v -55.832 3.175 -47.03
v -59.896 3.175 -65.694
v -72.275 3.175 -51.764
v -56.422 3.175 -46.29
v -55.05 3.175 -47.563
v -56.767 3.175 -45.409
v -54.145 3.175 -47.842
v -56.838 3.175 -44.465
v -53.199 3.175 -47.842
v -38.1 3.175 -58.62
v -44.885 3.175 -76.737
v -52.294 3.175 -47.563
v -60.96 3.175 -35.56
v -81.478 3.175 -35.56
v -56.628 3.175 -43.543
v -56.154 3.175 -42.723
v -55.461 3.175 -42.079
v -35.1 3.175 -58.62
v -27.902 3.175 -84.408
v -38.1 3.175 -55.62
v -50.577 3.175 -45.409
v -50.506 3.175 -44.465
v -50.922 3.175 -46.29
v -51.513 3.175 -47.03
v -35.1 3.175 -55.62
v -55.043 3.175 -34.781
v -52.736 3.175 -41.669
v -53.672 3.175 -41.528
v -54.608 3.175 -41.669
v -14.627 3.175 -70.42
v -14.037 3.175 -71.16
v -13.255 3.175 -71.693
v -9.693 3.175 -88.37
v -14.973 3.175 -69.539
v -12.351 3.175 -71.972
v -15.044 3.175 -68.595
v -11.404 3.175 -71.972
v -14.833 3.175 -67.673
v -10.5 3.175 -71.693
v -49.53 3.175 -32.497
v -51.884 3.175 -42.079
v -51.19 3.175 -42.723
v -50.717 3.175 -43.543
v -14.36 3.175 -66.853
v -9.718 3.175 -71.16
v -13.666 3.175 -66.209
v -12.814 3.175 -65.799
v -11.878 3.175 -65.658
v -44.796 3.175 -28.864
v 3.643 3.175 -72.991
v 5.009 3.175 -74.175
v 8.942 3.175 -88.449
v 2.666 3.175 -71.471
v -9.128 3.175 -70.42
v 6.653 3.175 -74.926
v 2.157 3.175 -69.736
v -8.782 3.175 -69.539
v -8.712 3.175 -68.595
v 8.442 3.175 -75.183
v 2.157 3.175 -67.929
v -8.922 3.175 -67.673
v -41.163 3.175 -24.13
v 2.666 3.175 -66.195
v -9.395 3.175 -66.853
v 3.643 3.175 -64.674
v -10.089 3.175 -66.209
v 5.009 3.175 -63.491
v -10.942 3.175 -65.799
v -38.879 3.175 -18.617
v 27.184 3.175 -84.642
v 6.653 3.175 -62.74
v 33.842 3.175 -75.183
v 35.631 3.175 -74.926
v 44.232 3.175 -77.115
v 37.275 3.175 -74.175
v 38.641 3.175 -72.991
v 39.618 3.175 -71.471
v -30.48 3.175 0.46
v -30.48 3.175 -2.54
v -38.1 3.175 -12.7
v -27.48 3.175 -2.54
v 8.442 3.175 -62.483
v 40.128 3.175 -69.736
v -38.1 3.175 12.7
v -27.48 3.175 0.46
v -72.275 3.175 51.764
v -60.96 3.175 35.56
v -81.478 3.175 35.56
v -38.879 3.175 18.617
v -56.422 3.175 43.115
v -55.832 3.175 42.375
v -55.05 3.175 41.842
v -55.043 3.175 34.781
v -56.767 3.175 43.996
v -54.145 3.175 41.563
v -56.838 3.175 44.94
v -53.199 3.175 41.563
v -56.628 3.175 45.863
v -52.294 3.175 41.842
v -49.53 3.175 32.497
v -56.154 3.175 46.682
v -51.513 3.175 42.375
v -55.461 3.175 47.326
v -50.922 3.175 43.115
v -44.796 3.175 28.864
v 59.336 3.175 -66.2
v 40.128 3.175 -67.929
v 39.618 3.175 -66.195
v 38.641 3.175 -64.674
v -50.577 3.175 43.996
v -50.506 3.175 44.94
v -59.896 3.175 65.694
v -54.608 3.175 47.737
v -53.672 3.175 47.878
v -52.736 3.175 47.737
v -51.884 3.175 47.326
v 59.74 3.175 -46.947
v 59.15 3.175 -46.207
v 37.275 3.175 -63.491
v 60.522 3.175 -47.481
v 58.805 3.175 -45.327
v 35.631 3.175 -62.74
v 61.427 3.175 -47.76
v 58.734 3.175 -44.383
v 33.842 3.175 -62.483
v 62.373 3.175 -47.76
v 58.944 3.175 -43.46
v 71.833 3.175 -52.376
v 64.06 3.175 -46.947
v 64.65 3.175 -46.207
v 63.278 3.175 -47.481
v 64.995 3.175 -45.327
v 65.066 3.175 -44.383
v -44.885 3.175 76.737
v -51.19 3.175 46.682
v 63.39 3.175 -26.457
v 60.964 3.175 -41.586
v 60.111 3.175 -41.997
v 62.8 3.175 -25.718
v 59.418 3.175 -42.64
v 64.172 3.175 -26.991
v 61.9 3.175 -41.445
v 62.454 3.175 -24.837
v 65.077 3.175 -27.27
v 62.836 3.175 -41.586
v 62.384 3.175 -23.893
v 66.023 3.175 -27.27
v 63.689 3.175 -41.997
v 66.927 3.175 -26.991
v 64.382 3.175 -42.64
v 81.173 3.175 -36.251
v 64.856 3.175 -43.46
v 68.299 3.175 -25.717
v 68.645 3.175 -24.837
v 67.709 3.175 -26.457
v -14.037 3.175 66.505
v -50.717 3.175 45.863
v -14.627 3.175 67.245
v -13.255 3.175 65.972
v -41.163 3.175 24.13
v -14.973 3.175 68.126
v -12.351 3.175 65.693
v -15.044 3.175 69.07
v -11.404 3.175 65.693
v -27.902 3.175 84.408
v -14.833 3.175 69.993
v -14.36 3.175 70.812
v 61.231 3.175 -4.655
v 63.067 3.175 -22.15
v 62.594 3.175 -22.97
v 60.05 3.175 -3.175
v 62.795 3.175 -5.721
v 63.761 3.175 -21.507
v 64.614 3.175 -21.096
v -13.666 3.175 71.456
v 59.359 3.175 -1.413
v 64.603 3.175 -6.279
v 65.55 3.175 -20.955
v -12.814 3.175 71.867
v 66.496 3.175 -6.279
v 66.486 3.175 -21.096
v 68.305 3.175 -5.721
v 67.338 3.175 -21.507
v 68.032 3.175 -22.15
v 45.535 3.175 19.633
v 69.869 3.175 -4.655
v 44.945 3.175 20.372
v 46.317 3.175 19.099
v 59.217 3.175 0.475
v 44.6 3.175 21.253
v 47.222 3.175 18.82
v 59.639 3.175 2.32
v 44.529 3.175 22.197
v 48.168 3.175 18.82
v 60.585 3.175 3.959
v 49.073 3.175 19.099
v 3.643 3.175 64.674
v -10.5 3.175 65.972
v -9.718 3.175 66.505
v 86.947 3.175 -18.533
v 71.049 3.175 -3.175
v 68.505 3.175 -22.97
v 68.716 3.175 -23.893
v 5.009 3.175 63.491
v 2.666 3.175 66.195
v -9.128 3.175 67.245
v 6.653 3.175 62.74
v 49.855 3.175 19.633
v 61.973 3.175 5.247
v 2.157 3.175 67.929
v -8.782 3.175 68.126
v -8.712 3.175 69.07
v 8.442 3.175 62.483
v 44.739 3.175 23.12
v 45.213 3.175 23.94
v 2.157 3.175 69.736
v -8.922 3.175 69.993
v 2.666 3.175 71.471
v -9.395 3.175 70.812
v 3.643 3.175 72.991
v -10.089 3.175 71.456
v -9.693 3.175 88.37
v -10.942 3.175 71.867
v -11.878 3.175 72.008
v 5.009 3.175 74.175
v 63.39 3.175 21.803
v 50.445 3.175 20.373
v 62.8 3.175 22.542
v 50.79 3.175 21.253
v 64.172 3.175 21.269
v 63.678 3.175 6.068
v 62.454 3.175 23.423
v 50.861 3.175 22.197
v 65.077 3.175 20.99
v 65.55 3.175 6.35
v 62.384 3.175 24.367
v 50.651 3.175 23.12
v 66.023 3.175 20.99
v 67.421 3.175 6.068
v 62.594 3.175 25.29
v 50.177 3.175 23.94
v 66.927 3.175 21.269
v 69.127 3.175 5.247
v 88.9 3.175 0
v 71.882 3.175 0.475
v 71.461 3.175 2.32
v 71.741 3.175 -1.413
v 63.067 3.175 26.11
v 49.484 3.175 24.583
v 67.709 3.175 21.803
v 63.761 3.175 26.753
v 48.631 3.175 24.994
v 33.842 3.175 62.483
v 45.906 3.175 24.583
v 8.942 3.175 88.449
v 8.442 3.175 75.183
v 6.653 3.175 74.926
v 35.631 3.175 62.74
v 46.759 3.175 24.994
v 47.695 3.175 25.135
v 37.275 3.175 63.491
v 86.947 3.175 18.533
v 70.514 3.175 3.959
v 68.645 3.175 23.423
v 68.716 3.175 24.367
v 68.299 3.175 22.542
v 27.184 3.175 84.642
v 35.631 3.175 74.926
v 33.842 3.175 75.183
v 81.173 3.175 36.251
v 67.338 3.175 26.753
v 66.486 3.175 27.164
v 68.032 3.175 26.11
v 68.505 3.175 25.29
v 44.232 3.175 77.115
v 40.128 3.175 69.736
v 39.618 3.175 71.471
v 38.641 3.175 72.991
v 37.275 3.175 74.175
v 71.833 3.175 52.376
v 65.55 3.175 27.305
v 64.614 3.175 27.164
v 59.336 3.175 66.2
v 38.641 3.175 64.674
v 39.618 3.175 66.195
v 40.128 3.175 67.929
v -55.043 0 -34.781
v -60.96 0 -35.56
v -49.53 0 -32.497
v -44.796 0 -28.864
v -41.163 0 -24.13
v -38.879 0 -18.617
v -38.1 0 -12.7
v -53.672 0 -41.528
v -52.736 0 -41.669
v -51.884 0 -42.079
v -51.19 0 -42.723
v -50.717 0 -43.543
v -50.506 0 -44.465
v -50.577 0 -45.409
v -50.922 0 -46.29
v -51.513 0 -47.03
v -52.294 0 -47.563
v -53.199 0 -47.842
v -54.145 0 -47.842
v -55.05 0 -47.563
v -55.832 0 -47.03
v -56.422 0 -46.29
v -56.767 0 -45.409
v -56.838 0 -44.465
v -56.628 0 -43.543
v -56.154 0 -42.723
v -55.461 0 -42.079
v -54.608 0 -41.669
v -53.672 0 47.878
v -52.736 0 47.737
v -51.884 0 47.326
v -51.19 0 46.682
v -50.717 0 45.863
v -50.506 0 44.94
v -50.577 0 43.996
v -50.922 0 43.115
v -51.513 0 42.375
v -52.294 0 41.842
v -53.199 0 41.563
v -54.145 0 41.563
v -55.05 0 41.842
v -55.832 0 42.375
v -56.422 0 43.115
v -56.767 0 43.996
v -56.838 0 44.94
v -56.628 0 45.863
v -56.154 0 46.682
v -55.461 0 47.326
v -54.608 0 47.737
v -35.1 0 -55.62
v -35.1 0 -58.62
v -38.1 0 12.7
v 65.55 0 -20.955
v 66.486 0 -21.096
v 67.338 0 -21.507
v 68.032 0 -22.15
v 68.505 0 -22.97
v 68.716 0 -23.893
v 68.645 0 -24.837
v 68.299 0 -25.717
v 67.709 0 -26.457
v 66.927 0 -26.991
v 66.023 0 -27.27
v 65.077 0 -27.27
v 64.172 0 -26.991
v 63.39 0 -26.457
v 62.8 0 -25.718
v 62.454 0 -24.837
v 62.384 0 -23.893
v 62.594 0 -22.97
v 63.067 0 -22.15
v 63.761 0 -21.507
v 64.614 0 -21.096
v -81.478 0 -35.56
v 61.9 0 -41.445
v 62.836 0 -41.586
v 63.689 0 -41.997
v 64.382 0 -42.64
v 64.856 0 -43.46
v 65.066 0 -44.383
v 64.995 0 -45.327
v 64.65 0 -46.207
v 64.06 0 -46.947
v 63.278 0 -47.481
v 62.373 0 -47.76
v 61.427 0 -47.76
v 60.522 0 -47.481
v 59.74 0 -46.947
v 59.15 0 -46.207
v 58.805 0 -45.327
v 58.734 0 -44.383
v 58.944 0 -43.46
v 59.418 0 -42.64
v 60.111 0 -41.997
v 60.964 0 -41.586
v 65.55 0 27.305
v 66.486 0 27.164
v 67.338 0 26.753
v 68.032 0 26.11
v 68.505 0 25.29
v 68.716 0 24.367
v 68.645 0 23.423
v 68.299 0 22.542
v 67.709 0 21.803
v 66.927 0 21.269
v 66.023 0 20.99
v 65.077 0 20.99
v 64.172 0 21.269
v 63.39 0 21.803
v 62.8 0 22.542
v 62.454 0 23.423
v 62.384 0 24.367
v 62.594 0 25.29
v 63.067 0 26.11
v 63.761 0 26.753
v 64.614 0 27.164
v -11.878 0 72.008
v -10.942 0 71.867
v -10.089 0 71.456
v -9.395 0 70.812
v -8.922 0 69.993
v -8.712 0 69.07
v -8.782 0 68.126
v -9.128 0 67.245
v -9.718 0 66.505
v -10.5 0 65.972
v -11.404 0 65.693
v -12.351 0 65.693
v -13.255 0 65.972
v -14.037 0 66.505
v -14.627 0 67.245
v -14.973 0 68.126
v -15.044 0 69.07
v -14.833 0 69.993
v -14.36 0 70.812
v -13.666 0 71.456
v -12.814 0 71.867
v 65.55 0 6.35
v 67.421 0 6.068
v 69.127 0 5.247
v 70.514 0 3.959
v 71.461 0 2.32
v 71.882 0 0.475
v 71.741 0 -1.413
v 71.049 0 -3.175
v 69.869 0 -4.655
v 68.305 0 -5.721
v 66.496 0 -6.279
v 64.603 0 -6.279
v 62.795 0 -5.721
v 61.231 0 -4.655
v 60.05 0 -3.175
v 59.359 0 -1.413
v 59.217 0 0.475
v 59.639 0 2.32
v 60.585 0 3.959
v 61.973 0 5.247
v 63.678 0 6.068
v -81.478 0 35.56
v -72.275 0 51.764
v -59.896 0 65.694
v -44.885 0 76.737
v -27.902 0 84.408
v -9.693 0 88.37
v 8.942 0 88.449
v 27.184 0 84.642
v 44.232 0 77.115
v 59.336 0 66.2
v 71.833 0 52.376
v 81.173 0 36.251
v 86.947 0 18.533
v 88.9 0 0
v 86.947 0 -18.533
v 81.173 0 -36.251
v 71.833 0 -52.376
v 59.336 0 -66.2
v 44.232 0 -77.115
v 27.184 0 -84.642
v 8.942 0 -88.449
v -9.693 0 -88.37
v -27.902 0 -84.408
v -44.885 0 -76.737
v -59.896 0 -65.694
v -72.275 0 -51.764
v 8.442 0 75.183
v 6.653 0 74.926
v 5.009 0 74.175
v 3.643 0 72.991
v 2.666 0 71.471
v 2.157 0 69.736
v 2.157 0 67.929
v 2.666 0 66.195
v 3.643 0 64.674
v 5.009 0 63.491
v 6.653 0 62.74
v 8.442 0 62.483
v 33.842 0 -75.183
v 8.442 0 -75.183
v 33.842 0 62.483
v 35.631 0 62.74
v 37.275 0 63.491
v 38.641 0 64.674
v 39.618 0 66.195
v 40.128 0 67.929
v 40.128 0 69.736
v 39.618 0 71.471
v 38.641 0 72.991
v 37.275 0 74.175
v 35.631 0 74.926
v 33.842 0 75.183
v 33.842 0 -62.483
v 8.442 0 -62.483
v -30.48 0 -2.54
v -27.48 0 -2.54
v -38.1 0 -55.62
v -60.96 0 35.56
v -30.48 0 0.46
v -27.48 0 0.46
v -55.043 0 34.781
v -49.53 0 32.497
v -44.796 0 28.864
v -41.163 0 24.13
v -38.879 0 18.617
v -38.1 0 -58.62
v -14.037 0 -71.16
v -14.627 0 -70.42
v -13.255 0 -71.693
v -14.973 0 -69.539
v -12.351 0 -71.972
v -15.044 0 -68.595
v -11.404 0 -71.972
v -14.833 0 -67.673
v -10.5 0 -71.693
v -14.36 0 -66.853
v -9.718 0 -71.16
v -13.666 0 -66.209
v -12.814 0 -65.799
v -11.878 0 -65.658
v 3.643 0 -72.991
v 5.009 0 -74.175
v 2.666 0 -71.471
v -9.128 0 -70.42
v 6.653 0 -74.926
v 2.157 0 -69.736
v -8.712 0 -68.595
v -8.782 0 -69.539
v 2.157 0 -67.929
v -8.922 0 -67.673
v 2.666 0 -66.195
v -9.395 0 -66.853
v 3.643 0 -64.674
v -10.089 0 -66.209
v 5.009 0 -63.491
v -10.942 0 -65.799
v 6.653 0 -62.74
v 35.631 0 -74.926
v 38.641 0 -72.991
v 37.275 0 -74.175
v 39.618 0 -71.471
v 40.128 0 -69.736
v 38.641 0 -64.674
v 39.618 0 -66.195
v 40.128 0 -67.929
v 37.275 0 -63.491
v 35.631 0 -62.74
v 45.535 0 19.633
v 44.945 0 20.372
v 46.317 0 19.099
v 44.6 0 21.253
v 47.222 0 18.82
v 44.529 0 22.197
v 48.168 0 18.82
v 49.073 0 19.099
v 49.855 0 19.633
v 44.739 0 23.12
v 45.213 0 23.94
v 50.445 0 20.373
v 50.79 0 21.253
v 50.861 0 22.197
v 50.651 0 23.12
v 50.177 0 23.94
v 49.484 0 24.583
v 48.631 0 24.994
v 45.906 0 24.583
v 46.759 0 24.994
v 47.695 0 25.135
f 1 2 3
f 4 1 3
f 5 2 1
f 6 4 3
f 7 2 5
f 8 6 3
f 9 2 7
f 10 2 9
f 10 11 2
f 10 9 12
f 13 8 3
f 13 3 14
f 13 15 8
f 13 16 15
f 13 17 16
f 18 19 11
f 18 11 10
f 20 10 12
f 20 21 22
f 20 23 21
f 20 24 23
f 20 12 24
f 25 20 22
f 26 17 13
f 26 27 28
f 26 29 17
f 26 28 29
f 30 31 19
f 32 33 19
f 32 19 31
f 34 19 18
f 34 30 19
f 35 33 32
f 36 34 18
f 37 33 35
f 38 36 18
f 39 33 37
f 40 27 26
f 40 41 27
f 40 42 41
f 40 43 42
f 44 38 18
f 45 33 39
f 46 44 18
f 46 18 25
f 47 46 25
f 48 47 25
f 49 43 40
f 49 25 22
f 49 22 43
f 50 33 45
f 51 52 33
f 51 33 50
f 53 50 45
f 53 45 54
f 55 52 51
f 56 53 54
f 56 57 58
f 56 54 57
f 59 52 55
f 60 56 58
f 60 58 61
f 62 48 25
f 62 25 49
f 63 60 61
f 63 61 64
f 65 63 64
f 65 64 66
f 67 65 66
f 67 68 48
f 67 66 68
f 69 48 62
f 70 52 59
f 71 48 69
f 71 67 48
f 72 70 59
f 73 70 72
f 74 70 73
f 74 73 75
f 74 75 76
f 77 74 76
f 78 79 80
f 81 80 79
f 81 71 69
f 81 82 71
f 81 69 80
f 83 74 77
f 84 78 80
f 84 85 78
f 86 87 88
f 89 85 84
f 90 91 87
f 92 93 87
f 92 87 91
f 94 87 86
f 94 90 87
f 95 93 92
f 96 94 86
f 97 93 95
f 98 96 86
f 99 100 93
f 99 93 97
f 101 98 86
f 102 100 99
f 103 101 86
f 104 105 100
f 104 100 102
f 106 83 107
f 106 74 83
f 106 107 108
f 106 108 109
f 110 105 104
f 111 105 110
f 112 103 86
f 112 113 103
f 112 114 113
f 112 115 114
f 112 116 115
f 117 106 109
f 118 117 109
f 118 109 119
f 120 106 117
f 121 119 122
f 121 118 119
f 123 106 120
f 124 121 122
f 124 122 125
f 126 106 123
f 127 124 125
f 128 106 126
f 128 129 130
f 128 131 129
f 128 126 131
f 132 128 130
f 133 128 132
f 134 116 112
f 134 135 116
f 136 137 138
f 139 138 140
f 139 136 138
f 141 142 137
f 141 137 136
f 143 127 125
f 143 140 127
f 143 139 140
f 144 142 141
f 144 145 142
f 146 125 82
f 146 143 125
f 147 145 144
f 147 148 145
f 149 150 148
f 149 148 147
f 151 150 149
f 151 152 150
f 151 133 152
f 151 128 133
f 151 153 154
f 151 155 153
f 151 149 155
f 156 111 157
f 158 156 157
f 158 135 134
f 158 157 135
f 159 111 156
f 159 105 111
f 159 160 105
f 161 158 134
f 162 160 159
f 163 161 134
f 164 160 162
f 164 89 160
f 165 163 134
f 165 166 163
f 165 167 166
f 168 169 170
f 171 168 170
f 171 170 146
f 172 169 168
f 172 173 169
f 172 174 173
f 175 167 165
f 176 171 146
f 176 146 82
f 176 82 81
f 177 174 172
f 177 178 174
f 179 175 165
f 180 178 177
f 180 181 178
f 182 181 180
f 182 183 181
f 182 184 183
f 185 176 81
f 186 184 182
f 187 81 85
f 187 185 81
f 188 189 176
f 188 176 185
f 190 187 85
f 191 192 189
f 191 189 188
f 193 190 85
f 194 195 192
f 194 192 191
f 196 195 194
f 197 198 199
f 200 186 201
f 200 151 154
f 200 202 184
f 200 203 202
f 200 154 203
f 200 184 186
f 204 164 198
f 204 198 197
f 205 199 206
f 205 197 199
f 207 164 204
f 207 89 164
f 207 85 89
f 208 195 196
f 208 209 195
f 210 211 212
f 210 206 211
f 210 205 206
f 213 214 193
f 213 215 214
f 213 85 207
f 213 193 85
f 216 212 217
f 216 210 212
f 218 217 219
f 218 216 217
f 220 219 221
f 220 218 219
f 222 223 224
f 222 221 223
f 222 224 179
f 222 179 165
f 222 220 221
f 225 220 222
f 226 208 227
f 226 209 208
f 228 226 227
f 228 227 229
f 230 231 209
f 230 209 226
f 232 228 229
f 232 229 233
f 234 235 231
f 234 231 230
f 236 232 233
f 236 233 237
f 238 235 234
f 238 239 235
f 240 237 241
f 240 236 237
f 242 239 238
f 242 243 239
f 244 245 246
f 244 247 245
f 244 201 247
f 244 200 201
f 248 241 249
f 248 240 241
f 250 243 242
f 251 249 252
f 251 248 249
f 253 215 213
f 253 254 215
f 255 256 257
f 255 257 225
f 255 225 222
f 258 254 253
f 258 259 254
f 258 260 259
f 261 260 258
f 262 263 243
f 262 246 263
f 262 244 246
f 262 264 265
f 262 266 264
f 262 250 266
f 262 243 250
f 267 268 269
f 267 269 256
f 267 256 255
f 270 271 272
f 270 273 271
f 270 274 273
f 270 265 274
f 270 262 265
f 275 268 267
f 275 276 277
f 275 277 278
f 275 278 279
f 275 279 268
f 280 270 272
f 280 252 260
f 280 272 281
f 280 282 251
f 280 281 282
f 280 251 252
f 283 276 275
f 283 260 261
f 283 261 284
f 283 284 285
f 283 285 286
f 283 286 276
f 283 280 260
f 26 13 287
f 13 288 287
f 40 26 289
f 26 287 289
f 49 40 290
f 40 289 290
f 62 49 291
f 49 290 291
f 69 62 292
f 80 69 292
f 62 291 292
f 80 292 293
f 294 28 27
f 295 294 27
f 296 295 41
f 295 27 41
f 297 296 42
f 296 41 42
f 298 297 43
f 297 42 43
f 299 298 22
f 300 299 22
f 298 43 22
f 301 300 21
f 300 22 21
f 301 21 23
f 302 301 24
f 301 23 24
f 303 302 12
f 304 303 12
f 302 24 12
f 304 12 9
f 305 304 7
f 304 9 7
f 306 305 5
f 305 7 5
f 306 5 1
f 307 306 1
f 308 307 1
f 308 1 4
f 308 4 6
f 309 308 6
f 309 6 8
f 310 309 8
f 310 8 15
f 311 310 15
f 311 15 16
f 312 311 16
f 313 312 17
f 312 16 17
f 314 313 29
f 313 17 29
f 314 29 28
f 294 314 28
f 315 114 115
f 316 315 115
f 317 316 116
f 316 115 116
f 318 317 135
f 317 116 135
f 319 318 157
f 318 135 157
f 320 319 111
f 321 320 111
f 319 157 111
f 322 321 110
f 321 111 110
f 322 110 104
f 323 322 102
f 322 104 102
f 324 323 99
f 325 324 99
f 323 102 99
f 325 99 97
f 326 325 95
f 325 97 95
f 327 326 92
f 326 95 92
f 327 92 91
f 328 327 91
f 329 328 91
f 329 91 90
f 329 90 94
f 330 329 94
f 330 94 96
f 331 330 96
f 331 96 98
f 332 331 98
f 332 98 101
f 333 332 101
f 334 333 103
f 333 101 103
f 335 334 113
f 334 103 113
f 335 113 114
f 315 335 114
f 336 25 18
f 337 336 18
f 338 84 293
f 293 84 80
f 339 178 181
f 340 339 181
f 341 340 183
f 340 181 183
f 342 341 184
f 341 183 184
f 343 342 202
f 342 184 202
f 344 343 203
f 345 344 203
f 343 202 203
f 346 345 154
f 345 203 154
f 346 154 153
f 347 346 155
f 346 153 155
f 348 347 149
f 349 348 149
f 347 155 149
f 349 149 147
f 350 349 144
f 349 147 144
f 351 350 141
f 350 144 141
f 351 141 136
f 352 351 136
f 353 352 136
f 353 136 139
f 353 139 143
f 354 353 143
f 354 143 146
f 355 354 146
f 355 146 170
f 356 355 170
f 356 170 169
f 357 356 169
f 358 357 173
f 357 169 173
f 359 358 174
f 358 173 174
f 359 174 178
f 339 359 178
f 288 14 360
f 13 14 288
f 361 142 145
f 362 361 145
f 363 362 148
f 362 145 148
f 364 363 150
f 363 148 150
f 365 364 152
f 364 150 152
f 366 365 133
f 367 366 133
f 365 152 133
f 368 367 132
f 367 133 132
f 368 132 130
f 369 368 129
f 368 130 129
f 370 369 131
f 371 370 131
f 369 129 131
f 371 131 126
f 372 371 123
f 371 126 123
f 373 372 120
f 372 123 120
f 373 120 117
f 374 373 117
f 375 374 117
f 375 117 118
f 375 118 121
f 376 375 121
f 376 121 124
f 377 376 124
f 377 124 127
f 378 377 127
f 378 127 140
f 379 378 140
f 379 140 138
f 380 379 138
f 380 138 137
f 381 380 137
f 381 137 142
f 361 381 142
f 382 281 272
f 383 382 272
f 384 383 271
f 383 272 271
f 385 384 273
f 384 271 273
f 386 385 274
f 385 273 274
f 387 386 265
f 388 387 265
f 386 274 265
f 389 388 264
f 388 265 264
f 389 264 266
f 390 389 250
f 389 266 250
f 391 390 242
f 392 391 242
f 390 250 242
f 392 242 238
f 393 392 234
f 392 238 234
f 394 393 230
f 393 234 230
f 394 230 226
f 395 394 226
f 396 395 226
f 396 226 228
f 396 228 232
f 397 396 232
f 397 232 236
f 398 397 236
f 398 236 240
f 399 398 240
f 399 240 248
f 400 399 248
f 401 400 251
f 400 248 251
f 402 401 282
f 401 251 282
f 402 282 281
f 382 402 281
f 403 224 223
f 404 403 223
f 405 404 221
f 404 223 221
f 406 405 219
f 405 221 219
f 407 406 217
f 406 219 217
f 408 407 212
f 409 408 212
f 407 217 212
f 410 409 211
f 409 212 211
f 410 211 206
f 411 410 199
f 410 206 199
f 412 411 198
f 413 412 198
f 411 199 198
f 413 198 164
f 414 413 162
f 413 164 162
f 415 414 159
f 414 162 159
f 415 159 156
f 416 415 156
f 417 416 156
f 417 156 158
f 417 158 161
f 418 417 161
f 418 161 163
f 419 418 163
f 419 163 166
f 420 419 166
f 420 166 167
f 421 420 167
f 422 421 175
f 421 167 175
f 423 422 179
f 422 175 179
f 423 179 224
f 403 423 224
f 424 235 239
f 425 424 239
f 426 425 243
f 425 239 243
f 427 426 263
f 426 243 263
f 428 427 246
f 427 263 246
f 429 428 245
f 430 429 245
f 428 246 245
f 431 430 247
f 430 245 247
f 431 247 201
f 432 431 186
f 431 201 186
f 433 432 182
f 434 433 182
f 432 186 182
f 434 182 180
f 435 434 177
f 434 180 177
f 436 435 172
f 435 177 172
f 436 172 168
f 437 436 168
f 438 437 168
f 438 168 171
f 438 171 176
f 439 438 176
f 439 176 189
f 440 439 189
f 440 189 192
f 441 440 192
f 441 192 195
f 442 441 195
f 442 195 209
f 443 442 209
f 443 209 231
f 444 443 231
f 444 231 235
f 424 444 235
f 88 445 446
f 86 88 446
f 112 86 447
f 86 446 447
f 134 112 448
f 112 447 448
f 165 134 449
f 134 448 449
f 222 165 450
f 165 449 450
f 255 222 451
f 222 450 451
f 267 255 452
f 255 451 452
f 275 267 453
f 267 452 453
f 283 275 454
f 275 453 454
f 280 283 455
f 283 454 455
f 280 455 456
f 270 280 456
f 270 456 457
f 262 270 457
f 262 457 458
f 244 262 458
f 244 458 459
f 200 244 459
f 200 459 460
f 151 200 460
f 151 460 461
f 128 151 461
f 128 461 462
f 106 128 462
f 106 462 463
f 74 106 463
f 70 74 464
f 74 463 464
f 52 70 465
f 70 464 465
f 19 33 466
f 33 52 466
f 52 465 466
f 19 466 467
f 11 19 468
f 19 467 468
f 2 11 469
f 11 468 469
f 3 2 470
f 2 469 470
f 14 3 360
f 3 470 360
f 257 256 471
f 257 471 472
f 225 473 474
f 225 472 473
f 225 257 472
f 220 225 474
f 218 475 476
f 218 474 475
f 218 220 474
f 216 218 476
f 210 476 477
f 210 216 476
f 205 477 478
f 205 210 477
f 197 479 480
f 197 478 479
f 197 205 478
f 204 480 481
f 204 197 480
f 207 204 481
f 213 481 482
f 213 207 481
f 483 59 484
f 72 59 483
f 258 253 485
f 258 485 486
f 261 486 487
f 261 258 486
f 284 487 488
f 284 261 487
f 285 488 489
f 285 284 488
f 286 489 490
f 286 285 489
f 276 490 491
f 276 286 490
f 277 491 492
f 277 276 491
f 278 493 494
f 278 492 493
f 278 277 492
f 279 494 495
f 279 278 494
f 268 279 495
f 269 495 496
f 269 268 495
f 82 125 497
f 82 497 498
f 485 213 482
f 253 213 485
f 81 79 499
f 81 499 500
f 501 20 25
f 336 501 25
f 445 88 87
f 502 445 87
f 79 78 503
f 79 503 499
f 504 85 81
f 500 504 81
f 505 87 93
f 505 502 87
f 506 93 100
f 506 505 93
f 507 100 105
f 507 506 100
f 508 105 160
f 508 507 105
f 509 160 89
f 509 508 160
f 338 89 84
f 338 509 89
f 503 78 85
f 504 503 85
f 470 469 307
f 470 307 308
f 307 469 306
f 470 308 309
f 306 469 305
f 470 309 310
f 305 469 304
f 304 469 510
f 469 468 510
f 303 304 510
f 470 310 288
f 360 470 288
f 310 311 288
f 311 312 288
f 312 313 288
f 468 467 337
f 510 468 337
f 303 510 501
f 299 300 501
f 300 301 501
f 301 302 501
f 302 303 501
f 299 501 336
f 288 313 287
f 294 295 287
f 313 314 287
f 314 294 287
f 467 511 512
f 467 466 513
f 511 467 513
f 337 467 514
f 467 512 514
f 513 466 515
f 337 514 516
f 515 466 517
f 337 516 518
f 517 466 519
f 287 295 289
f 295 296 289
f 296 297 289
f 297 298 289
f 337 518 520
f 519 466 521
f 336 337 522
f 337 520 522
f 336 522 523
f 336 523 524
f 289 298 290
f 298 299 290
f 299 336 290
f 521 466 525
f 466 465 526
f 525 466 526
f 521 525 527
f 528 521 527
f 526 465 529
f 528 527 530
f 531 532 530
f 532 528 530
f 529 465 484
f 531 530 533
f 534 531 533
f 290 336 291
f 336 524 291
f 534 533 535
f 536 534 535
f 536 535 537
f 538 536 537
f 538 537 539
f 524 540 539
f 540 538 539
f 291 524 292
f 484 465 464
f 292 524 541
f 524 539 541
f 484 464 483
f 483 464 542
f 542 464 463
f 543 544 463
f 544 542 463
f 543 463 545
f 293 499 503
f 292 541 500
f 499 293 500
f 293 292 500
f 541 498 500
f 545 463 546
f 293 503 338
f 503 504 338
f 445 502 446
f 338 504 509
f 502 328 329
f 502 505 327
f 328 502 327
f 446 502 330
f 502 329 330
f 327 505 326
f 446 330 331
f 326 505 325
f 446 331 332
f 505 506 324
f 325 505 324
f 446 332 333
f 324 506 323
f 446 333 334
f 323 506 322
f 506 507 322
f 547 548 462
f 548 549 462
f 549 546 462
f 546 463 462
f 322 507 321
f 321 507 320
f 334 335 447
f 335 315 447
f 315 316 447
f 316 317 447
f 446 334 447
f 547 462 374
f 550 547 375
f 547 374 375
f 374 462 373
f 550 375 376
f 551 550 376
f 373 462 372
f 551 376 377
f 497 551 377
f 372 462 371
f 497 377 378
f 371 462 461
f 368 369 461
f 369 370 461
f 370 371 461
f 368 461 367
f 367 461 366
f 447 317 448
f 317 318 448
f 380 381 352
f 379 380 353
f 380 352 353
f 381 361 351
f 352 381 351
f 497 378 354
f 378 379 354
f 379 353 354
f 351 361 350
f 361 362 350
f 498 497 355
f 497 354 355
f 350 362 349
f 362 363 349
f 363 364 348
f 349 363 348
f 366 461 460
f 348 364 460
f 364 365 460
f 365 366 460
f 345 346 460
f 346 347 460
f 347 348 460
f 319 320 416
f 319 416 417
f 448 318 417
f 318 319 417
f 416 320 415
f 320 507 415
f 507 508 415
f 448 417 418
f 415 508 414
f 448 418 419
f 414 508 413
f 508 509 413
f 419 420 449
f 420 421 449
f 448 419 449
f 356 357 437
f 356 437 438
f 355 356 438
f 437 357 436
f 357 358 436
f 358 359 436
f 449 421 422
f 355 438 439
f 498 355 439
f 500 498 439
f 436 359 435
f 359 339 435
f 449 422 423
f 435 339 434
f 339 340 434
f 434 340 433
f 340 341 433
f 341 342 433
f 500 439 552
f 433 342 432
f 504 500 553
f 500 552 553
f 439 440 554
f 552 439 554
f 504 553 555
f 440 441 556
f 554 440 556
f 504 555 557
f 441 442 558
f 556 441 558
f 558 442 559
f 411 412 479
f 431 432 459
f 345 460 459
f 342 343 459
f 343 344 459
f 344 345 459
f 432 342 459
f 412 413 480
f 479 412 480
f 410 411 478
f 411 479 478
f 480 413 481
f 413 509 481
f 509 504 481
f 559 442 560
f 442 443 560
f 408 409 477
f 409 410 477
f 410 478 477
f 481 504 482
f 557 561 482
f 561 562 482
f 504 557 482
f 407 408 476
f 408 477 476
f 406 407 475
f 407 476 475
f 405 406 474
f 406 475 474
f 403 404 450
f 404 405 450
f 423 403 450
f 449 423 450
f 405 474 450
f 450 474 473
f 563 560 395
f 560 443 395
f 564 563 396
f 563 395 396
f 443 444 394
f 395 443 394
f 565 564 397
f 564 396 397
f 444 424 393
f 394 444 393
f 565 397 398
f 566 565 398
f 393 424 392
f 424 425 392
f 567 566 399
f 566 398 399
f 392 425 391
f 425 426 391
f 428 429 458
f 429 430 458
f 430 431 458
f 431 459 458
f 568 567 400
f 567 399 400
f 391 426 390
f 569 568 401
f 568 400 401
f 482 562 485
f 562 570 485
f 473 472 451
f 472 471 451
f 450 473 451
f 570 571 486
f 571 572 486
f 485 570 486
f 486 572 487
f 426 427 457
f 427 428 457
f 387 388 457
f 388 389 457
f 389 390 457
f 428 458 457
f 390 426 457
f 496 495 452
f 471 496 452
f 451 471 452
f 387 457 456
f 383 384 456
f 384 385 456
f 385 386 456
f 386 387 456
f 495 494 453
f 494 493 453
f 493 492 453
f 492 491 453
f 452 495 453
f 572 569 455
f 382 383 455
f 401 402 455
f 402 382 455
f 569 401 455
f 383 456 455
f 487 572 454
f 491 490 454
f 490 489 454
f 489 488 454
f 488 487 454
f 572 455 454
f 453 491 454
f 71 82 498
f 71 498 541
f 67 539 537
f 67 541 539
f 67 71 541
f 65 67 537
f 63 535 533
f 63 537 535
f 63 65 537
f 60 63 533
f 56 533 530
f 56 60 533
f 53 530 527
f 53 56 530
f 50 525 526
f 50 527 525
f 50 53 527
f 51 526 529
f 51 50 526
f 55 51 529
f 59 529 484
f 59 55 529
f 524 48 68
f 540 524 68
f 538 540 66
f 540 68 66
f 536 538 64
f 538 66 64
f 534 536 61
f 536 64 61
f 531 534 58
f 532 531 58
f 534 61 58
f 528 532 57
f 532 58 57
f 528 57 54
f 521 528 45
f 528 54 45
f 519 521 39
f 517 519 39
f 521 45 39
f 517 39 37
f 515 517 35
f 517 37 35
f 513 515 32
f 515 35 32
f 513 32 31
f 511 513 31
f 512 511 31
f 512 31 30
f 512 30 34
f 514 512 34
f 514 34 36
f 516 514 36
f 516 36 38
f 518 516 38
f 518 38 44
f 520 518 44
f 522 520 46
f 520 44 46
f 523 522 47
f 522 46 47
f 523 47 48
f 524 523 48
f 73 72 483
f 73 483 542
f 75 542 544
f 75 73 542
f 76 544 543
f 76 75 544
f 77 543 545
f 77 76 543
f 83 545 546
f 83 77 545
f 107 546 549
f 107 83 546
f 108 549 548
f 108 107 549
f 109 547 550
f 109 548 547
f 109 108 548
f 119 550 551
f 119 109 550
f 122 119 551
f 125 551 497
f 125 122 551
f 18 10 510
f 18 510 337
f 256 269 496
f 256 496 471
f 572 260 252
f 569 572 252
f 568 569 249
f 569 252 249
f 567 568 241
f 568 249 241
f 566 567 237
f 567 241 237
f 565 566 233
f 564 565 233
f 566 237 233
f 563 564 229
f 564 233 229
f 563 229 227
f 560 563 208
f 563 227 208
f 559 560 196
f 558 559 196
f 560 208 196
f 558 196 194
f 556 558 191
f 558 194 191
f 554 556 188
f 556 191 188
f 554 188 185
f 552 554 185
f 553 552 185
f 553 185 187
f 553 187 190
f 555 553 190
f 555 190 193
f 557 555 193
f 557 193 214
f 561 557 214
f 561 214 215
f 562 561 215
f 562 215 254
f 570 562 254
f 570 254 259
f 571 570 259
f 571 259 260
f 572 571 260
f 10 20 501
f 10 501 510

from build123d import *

# Parameters (mm, degrees)
SKETCH2_R           = 88.9
BOSS_EXTRUDE1_DEPTH = 3.175
SKETCH3_R           = 3.175
SKETCH3_W           = 50.8
SKETCH3_H           = 71.12
CUT_EXTRUDE1_DEPTH  = 3.175
SKETCH5_W           = 3
SKETCH5_H           = 3
SKETCH5_R           = 3.175
CUT_EXTRUDE2_DEPTH  = 126.763669734
FILLET1_R           = 22.86
SKETCH6_R           = 6.35
CUT_EXTRUDE3_DEPTH  = 126.763669734


with BuildPart() as part:
    # Sketch2 → Boss-Extrude1 (new body)
    with BuildSketch(Plane(origin=(0, 0, 0), x_dir=(1, 0, 0), z_dir=(0, 1, 0))):
        with Locations(Location((0, 0, 0), (0, 0, 270))):
            Circle(SKETCH2_R)
    extrude(amount=BOSS_EXTRUDE1_DEPTH)

    # Sketch3 → Cut-Extrude1 (cut)
    with BuildSketch(Plane(origin=(0, 3.175, 0), x_dir=(1, 0, 0), z_dir=(0, 1, 0))):
        with Locations(Location((65.549718535, -24.13, 0), (0, 0, 270))):
            Circle(SKETCH3_R)
        with Locations(Location((65.549718535, 24.13, 0), (0, 0, 270))):
            Circle(SKETCH3_R)
        with Locations(Location((-53.672052261, 44.702721462, 0), (0, 0, 270))):
            Circle(SKETCH3_R)
        with Locations(Location((-11.877666274, 68.832721462, 0), (0, 0, 270))):
            Circle(SKETCH3_R)
        with Locations(Location((-11.877666274, -68.832721462, 0), (0, 0, 270))):
            Circle(SKETCH3_R)
        with Locations(Location((-53.672052261, -44.702721462, 0), (0, 0, 270))):
            Circle(SKETCH3_R)
        with Locations((-63.5, 0)):
            Rectangle(SKETCH3_W, SKETCH3_H)
    extrude(amount=-CUT_EXTRUDE1_DEPTH, mode=Mode.SUBTRACT)

    # Sketch5 → Cut-Extrude2 (cut, through all)
    with BuildSketch(Plane(origin=(0, 3.175, 0), x_dir=(1, 0, 0), z_dir=(0, 1, 0))):
        with Locations((-36.6, 57.12)):
            Rectangle(SKETCH5_W, SKETCH5_H)
        with Locations((-28.98, 1.04)):
            Rectangle(SKETCH5_W, SKETCH5_H)
        with Locations(Location((61.9, 44.62, 0), (0, 0, 270))):
            Circle(SKETCH5_R)
        with Locations(Location((47.695, -21.96, 0), (0, 0, 270))):
            Circle(SKETCH5_R)
    extrude(amount=-CUT_EXTRUDE2_DEPTH, mode=Mode.SUBTRACT)

    # Fillet1
    fillet1_edges = [part.edges().sort_by_distance(p)[0] for p in [
        (-38.1, 1.5875, 35.56),
        (-38.1, 1.5875, -35.56),
    ]]
    fillet(fillet1_edges, radius=FILLET1_R)

    # Sketch6 → Cut-Extrude3 (cut, through all)
    with BuildSketch(Plane(origin=(0, 3.175, 0), x_dir=(1, 0, 0), z_dir=(0, 1, 0))):
        with Locations(Location((65.549718535, 0, 0), (0, 0, 270))):
            Circle(SKETCH6_R)
        with BuildLine():
            Line((8.442333726, 75.182721462), (33.842333726, 75.182721462))
            ThreePointArc((33.842333726, 75.182721462), (40.192333726, 68.832721462), (33.842333726, 62.482721462))
            Line((33.842333726, 62.482721462), (8.442333726, 62.482721462))
            ThreePointArc((8.442333726, 62.482721462), (2.092333726, 68.832721462), (8.442333726, 75.182721462))
        make_face()
        with BuildLine():
            Line((8.442333726, -62.482721462), (33.842333726, -62.482721462))
            ThreePointArc((33.842333726, -62.482721462), (40.192333726, -68.832721462), (33.842333726, -75.182721462))
            Line((33.842333726, -75.182721462), (8.442333726, -75.182721462))
            ThreePointArc((8.442333726, -75.182721462), (2.092333726, -68.832721462), (8.442333726, -62.482721462))
        make_face()
    extrude(amount=-CUT_EXTRUDE3_DEPTH, mode=Mode.SUBTRACT)


solid = part.part
